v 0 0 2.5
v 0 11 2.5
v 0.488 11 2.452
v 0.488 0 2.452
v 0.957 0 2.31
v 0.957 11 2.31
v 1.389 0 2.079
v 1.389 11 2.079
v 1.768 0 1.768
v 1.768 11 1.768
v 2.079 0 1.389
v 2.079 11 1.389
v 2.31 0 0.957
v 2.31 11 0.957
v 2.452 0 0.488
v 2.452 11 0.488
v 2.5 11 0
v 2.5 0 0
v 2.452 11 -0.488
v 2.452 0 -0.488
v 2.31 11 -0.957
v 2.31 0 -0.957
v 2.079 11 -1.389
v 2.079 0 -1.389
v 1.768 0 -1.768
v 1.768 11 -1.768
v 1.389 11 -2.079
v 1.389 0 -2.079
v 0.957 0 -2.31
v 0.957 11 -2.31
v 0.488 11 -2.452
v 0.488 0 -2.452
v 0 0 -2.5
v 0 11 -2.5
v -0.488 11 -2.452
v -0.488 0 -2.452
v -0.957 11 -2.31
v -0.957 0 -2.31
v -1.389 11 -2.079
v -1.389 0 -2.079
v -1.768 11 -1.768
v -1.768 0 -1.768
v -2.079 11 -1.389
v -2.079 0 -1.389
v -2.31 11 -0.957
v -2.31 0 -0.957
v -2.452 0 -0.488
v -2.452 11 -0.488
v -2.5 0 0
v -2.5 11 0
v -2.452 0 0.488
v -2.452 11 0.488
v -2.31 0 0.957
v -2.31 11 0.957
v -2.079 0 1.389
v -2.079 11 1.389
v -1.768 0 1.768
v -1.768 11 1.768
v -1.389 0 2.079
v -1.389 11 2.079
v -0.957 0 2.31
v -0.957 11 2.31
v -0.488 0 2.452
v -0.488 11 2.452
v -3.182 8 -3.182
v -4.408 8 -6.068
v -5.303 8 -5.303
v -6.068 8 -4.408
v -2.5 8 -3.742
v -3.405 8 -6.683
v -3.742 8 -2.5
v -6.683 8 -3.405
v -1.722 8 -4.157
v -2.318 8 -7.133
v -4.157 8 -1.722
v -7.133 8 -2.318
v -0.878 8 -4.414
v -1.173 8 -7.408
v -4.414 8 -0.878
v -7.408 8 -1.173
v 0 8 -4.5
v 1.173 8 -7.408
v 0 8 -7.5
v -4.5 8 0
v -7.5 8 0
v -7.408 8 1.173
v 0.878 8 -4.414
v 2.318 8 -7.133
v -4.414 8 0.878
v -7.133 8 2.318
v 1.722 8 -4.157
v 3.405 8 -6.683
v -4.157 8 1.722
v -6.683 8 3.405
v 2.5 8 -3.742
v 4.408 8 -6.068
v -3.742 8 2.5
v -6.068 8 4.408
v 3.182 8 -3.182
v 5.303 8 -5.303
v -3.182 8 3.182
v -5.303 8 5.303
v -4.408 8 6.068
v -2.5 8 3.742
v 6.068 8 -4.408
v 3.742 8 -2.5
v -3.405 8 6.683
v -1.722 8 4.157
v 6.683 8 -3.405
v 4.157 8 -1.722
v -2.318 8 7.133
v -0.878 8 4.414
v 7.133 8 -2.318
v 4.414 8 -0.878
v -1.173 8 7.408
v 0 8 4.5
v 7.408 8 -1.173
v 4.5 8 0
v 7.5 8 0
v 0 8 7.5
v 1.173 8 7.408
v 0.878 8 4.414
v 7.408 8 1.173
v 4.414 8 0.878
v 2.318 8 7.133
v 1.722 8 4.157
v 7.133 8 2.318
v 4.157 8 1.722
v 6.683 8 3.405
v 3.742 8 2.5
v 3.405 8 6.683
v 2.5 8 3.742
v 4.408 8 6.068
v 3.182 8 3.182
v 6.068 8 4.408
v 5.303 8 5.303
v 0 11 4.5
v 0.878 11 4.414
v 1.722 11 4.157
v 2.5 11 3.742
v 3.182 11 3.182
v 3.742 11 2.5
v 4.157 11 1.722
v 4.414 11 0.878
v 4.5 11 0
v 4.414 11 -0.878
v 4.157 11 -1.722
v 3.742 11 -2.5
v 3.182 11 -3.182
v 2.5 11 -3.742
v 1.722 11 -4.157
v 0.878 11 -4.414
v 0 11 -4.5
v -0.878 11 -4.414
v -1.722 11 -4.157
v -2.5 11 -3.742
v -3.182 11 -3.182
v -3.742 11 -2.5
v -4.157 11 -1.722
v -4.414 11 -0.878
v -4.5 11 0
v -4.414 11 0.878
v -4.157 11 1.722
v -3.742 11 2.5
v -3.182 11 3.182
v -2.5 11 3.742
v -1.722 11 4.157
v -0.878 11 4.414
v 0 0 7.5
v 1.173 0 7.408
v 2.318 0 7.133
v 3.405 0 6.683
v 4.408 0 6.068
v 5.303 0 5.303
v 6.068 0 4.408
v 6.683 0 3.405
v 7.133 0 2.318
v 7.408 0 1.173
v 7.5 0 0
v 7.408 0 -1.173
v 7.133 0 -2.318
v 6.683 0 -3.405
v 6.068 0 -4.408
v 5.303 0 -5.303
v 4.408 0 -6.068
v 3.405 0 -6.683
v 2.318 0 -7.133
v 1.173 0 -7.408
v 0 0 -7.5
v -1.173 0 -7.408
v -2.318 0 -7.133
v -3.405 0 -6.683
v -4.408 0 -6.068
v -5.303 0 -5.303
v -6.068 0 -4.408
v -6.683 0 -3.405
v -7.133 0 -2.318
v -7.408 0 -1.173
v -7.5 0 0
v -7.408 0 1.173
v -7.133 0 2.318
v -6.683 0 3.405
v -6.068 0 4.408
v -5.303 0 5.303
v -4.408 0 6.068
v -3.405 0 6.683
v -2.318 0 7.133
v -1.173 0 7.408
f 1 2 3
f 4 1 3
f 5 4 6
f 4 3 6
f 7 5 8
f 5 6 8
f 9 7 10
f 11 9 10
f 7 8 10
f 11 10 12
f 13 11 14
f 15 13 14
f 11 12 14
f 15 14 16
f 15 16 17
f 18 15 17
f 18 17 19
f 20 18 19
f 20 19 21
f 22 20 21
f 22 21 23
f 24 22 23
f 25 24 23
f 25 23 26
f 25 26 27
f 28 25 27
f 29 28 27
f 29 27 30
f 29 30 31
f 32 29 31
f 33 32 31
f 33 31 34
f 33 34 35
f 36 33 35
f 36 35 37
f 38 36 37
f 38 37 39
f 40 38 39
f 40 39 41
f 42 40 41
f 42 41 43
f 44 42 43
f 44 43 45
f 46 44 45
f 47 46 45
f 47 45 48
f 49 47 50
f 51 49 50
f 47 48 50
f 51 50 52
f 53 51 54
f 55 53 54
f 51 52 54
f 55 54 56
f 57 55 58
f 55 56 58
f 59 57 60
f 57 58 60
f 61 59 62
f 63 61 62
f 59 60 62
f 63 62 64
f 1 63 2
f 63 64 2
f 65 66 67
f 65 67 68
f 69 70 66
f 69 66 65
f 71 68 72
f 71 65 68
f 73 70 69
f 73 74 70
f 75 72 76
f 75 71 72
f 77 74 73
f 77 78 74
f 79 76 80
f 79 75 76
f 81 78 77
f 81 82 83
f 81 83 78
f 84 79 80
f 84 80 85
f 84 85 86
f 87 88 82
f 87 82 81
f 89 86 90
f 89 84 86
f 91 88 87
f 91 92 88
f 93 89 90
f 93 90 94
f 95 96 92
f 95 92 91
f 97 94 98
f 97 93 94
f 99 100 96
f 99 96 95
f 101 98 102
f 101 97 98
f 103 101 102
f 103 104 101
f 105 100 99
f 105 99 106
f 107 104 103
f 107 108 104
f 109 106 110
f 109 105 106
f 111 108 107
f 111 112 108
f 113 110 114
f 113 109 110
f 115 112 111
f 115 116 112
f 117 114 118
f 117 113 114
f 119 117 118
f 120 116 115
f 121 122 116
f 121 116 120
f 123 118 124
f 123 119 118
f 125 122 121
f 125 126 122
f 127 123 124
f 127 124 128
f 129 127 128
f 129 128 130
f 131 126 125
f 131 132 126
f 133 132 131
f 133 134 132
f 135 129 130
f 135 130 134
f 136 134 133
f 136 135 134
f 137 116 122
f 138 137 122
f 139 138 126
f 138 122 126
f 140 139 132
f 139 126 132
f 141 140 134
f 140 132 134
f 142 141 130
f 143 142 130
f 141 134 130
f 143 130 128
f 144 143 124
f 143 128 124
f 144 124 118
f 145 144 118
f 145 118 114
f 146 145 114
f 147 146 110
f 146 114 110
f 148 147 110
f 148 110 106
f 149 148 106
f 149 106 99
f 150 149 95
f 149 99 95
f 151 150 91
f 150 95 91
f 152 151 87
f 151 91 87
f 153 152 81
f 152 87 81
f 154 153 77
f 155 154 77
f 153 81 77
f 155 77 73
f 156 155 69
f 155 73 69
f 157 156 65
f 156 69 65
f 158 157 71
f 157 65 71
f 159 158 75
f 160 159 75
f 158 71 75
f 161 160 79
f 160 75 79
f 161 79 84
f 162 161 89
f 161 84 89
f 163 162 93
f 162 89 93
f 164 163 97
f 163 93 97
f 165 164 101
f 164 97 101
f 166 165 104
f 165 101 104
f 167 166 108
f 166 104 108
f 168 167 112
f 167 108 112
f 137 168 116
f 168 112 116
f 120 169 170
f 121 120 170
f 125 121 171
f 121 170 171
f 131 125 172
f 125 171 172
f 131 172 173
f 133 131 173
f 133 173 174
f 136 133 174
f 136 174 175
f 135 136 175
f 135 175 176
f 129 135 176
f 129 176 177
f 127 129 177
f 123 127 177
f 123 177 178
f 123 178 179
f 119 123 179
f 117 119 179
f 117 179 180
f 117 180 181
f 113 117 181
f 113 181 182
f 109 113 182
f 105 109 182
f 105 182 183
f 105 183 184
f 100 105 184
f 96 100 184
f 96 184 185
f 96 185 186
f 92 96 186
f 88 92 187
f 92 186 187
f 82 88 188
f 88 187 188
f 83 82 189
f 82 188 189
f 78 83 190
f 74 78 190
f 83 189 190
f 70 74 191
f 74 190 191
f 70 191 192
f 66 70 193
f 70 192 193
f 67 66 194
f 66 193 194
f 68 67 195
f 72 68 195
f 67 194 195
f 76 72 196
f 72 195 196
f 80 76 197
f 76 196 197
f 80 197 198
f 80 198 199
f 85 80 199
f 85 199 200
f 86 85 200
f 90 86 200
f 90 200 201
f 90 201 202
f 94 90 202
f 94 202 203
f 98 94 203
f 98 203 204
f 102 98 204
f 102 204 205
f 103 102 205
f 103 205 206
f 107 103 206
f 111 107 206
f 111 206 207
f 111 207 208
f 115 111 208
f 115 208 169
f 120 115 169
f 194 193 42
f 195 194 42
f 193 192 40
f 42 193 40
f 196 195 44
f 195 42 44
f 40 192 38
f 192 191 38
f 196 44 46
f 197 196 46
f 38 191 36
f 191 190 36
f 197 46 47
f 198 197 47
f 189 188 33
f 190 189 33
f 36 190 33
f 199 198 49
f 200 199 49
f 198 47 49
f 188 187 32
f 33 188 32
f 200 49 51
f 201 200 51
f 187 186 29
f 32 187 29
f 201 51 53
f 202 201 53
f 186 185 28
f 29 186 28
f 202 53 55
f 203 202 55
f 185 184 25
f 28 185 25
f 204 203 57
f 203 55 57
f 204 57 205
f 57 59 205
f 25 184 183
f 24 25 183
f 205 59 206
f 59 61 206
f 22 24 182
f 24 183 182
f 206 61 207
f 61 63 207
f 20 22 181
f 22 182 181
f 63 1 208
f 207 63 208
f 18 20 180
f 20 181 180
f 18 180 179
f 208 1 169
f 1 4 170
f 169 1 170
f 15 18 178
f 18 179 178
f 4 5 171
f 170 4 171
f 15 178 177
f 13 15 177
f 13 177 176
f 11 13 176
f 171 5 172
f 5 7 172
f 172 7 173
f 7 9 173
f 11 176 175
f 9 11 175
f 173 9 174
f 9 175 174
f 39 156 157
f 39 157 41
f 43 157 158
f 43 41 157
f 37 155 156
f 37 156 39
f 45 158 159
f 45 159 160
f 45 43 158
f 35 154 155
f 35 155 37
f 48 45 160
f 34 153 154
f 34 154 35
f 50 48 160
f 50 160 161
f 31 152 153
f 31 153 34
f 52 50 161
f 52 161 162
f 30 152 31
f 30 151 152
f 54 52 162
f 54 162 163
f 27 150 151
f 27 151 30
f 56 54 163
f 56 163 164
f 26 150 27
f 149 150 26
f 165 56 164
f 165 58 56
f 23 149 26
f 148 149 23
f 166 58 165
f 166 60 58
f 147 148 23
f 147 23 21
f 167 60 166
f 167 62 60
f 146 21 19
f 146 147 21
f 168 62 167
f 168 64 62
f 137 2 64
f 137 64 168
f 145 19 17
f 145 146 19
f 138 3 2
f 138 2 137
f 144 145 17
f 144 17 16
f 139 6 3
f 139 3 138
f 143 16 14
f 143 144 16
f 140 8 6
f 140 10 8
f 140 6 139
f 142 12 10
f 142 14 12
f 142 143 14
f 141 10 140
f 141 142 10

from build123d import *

# Parameters (mm, degrees)
SKETCH1_R           = 7.5
BOSS_EXTRUDE1_DEPTH = 11
SKETCH2_R           = 2.5
CUT_EXTRUDE1_DEPTH  = 16.28070679
CUT_EXTRUDE3_START  = -3
SKETCH3_R           = 7.5
SKETCH3_R_2         = 4.5
CUT_EXTRUDE3_DEPTH  = 3


with BuildPart() as part:
    # Sketch1 → Boss-Extrude1 (new body)
    with BuildSketch(Plane(origin=(0, 0, 0), x_dir=(1, 0, 0), z_dir=(0, 1, 0))):
        with Locations(Location((0, 0, 0), (0, 0, 270))):
            Circle(SKETCH1_R)
    extrude(amount=BOSS_EXTRUDE1_DEPTH)

    # Sketch2 → Cut-Extrude1 (cut, through all)
    with BuildSketch(Plane(origin=(0, 11, 0), x_dir=(1, 0, 0), z_dir=(0, 1, 0))):
        with Locations(Location((0, 0, 0), (0, 0, 270))):
            Circle(SKETCH2_R)
    extrude(amount=-CUT_EXTRUDE1_DEPTH, mode=Mode.SUBTRACT)

    # Sketch3 → Cut-Extrude3 (cut)
    with BuildSketch(Plane(origin=(0, 11, 0), x_dir=(1, 0, 0), z_dir=(0, 1, 0)).offset(CUT_EXTRUDE3_START)):
        with Locations(Location((0, 0, 0), (0, 0, 270))):
            Circle(SKETCH3_R)
        with Locations(Location((0, 0, 0), (0, 0, 270))):
            Circle(SKETCH3_R_2, mode=Mode.SUBTRACT)
    extrude(amount=CUT_EXTRUDE3_DEPTH, mode=Mode.SUBTRACT)


solid = part.part
